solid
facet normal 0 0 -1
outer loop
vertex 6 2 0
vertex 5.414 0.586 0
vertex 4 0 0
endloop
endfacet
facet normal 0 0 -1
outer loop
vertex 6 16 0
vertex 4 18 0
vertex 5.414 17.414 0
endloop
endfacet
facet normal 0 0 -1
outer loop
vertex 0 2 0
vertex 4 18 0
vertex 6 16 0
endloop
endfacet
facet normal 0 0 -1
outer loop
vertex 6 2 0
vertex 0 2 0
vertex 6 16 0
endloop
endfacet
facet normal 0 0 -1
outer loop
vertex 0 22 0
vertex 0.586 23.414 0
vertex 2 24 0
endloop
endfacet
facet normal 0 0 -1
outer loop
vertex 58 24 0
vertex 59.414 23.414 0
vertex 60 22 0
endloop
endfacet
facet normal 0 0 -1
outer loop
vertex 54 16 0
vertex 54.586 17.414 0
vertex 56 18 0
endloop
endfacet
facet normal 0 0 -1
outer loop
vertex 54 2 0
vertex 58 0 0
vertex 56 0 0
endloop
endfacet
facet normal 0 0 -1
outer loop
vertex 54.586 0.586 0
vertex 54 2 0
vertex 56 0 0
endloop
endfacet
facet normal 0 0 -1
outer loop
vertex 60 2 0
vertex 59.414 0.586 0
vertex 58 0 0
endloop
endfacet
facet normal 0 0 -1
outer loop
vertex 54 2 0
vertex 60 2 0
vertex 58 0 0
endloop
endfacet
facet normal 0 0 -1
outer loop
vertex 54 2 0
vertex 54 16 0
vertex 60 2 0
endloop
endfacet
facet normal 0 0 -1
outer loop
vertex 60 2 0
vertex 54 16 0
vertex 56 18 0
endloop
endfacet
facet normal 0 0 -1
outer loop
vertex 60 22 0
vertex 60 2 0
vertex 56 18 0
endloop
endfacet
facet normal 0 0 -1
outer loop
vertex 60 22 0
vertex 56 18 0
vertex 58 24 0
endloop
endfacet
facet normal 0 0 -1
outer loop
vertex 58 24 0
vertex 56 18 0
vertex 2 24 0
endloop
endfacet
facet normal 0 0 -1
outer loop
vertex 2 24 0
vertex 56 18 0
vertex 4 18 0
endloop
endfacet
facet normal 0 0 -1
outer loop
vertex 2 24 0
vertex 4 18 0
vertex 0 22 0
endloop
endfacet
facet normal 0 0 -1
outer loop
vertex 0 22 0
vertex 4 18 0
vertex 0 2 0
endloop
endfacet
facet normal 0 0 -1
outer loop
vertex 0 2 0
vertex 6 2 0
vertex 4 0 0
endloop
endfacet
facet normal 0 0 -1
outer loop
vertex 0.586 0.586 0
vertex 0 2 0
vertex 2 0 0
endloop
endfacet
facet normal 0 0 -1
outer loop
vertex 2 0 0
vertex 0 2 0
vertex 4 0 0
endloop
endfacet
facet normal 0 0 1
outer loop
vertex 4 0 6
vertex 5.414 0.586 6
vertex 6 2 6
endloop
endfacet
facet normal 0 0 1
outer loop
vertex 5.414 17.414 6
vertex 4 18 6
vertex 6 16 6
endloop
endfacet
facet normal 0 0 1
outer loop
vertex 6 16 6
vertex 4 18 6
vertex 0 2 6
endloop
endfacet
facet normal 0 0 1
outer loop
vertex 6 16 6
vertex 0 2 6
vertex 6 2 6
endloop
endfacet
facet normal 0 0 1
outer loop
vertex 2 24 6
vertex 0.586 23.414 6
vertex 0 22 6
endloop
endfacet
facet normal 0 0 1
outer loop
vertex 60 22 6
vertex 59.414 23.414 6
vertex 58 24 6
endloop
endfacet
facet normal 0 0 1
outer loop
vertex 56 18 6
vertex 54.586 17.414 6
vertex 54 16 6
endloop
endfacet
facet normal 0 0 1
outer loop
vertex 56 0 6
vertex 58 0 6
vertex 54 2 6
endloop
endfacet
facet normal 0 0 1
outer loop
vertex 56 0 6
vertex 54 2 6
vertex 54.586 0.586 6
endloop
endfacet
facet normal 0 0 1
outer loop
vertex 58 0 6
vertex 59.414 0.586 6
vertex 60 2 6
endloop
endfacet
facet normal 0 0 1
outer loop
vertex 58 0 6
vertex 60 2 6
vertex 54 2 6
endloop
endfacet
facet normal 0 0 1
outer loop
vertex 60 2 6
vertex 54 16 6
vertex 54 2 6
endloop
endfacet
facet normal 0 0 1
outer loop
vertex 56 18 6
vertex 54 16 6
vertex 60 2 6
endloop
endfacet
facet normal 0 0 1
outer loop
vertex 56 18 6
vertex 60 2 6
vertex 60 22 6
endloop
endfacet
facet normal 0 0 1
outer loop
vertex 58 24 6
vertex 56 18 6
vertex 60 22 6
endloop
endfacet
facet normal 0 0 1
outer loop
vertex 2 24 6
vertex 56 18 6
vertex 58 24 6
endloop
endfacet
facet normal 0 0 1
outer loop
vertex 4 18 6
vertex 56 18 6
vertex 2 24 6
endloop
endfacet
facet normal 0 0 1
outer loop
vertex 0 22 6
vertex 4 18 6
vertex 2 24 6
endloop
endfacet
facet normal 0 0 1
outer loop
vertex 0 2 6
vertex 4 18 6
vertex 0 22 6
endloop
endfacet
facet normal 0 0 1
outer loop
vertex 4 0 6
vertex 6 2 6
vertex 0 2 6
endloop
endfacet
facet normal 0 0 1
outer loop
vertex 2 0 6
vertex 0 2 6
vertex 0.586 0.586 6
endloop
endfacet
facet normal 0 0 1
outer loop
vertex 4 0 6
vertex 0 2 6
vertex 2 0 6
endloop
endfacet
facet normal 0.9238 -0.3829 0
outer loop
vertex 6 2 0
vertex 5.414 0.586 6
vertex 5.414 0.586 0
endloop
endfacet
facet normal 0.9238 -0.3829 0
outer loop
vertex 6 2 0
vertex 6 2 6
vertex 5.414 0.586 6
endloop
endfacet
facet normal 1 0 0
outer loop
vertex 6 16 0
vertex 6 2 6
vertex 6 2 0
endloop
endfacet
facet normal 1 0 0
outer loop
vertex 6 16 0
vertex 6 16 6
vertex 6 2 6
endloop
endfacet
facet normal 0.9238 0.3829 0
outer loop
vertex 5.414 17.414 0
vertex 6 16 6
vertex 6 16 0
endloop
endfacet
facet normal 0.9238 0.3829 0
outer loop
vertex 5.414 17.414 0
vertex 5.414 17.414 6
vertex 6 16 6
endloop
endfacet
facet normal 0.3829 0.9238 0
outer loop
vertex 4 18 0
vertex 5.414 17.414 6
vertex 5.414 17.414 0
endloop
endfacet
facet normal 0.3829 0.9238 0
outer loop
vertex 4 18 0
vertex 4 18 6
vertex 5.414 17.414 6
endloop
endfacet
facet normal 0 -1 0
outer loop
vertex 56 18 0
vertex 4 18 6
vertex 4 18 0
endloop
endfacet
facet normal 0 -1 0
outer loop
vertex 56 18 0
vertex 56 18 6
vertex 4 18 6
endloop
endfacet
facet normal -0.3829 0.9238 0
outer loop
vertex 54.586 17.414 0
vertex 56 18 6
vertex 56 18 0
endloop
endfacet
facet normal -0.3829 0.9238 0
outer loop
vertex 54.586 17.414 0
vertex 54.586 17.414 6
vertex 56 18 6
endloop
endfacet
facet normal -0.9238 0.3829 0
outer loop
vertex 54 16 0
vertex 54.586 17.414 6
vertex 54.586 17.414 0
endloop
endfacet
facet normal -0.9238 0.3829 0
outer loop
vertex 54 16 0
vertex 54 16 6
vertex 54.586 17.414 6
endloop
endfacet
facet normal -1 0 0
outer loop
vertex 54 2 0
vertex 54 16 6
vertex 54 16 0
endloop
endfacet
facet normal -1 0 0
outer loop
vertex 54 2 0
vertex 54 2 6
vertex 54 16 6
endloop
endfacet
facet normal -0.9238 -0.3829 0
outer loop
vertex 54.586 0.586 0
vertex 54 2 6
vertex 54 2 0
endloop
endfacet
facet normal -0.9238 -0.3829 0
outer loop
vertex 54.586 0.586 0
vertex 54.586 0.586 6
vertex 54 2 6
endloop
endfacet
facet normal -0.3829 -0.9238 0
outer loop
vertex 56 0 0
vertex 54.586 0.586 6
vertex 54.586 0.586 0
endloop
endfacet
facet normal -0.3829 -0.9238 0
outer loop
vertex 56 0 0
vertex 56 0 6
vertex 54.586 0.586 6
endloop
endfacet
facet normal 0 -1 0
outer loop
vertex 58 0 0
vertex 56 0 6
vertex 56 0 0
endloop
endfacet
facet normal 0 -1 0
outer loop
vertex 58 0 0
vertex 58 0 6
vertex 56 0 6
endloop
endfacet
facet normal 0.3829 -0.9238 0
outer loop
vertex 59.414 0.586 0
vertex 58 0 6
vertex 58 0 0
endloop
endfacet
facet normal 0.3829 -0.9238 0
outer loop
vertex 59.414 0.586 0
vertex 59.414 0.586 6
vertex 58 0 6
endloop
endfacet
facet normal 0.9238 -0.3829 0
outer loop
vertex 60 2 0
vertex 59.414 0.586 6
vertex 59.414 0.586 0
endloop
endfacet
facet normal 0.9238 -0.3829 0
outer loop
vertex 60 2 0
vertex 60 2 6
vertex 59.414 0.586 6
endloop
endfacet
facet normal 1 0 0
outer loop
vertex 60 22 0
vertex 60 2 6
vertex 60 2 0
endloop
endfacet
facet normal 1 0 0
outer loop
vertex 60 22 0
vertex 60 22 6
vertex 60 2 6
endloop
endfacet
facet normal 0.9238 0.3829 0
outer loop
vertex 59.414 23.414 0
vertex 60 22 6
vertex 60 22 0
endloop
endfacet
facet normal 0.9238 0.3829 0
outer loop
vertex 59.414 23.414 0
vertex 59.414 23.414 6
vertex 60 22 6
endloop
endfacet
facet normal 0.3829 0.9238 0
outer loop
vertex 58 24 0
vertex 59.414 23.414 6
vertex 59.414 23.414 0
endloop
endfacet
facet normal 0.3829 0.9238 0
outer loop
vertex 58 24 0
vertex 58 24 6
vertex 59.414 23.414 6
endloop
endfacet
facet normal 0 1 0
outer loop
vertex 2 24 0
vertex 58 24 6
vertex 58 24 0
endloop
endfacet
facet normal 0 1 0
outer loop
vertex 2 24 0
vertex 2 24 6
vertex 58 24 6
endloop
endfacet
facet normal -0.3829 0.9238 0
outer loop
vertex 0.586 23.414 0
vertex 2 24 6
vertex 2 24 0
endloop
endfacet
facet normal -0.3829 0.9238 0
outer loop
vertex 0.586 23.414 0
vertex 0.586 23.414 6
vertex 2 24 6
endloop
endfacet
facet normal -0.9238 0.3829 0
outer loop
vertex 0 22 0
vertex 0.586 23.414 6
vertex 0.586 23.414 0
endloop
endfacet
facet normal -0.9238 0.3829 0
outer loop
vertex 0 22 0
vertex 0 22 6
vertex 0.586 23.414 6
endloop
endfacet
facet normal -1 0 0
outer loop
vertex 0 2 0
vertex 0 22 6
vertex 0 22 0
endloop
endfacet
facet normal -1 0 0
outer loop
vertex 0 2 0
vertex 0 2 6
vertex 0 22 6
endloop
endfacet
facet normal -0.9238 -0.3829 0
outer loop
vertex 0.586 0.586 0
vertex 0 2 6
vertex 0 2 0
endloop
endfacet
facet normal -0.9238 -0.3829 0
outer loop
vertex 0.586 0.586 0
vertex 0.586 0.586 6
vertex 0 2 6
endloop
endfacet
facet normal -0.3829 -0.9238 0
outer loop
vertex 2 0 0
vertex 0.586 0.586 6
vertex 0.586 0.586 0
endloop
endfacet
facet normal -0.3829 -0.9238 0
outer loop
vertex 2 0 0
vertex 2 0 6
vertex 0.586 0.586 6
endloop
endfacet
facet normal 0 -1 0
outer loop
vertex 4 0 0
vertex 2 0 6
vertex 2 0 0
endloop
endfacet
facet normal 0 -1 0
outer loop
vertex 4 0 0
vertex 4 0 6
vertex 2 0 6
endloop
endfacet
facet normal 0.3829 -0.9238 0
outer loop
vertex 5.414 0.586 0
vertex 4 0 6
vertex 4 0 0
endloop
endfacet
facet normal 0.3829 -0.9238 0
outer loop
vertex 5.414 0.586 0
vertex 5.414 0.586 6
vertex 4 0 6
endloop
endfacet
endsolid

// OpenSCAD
$fn = 32;

// ----------------------------------------------------------------------
// Clip blank: staple clip, 6 mm thick
// ----------------------------------------------------------------------

// --- parameters (mm) ---
profile_height = 6;       // extrusion height
profile_points = 24;      // points of the closed outline

profile = [[0, 2], [0.586, 0.586], [2, 0], [4, 0], [5.414, 0.586], [6, 2], [6, 16], [5.414, 17.414], [4, 18], [56, 18], [54.586, 17.414], [54, 16], [54, 2], [54.586, 0.586], [56, 0], [58, 0], [59.414, 0.586], [60, 2], [60, 22], [59.414, 23.414], [58, 24], [2, 24], [0.586, 23.414], [0, 22]];  // single closed polygon, 24 points, counter clockwise

// --- the one profile operation ---
linear_extrude(height = profile_height) polygon(points = profile);
